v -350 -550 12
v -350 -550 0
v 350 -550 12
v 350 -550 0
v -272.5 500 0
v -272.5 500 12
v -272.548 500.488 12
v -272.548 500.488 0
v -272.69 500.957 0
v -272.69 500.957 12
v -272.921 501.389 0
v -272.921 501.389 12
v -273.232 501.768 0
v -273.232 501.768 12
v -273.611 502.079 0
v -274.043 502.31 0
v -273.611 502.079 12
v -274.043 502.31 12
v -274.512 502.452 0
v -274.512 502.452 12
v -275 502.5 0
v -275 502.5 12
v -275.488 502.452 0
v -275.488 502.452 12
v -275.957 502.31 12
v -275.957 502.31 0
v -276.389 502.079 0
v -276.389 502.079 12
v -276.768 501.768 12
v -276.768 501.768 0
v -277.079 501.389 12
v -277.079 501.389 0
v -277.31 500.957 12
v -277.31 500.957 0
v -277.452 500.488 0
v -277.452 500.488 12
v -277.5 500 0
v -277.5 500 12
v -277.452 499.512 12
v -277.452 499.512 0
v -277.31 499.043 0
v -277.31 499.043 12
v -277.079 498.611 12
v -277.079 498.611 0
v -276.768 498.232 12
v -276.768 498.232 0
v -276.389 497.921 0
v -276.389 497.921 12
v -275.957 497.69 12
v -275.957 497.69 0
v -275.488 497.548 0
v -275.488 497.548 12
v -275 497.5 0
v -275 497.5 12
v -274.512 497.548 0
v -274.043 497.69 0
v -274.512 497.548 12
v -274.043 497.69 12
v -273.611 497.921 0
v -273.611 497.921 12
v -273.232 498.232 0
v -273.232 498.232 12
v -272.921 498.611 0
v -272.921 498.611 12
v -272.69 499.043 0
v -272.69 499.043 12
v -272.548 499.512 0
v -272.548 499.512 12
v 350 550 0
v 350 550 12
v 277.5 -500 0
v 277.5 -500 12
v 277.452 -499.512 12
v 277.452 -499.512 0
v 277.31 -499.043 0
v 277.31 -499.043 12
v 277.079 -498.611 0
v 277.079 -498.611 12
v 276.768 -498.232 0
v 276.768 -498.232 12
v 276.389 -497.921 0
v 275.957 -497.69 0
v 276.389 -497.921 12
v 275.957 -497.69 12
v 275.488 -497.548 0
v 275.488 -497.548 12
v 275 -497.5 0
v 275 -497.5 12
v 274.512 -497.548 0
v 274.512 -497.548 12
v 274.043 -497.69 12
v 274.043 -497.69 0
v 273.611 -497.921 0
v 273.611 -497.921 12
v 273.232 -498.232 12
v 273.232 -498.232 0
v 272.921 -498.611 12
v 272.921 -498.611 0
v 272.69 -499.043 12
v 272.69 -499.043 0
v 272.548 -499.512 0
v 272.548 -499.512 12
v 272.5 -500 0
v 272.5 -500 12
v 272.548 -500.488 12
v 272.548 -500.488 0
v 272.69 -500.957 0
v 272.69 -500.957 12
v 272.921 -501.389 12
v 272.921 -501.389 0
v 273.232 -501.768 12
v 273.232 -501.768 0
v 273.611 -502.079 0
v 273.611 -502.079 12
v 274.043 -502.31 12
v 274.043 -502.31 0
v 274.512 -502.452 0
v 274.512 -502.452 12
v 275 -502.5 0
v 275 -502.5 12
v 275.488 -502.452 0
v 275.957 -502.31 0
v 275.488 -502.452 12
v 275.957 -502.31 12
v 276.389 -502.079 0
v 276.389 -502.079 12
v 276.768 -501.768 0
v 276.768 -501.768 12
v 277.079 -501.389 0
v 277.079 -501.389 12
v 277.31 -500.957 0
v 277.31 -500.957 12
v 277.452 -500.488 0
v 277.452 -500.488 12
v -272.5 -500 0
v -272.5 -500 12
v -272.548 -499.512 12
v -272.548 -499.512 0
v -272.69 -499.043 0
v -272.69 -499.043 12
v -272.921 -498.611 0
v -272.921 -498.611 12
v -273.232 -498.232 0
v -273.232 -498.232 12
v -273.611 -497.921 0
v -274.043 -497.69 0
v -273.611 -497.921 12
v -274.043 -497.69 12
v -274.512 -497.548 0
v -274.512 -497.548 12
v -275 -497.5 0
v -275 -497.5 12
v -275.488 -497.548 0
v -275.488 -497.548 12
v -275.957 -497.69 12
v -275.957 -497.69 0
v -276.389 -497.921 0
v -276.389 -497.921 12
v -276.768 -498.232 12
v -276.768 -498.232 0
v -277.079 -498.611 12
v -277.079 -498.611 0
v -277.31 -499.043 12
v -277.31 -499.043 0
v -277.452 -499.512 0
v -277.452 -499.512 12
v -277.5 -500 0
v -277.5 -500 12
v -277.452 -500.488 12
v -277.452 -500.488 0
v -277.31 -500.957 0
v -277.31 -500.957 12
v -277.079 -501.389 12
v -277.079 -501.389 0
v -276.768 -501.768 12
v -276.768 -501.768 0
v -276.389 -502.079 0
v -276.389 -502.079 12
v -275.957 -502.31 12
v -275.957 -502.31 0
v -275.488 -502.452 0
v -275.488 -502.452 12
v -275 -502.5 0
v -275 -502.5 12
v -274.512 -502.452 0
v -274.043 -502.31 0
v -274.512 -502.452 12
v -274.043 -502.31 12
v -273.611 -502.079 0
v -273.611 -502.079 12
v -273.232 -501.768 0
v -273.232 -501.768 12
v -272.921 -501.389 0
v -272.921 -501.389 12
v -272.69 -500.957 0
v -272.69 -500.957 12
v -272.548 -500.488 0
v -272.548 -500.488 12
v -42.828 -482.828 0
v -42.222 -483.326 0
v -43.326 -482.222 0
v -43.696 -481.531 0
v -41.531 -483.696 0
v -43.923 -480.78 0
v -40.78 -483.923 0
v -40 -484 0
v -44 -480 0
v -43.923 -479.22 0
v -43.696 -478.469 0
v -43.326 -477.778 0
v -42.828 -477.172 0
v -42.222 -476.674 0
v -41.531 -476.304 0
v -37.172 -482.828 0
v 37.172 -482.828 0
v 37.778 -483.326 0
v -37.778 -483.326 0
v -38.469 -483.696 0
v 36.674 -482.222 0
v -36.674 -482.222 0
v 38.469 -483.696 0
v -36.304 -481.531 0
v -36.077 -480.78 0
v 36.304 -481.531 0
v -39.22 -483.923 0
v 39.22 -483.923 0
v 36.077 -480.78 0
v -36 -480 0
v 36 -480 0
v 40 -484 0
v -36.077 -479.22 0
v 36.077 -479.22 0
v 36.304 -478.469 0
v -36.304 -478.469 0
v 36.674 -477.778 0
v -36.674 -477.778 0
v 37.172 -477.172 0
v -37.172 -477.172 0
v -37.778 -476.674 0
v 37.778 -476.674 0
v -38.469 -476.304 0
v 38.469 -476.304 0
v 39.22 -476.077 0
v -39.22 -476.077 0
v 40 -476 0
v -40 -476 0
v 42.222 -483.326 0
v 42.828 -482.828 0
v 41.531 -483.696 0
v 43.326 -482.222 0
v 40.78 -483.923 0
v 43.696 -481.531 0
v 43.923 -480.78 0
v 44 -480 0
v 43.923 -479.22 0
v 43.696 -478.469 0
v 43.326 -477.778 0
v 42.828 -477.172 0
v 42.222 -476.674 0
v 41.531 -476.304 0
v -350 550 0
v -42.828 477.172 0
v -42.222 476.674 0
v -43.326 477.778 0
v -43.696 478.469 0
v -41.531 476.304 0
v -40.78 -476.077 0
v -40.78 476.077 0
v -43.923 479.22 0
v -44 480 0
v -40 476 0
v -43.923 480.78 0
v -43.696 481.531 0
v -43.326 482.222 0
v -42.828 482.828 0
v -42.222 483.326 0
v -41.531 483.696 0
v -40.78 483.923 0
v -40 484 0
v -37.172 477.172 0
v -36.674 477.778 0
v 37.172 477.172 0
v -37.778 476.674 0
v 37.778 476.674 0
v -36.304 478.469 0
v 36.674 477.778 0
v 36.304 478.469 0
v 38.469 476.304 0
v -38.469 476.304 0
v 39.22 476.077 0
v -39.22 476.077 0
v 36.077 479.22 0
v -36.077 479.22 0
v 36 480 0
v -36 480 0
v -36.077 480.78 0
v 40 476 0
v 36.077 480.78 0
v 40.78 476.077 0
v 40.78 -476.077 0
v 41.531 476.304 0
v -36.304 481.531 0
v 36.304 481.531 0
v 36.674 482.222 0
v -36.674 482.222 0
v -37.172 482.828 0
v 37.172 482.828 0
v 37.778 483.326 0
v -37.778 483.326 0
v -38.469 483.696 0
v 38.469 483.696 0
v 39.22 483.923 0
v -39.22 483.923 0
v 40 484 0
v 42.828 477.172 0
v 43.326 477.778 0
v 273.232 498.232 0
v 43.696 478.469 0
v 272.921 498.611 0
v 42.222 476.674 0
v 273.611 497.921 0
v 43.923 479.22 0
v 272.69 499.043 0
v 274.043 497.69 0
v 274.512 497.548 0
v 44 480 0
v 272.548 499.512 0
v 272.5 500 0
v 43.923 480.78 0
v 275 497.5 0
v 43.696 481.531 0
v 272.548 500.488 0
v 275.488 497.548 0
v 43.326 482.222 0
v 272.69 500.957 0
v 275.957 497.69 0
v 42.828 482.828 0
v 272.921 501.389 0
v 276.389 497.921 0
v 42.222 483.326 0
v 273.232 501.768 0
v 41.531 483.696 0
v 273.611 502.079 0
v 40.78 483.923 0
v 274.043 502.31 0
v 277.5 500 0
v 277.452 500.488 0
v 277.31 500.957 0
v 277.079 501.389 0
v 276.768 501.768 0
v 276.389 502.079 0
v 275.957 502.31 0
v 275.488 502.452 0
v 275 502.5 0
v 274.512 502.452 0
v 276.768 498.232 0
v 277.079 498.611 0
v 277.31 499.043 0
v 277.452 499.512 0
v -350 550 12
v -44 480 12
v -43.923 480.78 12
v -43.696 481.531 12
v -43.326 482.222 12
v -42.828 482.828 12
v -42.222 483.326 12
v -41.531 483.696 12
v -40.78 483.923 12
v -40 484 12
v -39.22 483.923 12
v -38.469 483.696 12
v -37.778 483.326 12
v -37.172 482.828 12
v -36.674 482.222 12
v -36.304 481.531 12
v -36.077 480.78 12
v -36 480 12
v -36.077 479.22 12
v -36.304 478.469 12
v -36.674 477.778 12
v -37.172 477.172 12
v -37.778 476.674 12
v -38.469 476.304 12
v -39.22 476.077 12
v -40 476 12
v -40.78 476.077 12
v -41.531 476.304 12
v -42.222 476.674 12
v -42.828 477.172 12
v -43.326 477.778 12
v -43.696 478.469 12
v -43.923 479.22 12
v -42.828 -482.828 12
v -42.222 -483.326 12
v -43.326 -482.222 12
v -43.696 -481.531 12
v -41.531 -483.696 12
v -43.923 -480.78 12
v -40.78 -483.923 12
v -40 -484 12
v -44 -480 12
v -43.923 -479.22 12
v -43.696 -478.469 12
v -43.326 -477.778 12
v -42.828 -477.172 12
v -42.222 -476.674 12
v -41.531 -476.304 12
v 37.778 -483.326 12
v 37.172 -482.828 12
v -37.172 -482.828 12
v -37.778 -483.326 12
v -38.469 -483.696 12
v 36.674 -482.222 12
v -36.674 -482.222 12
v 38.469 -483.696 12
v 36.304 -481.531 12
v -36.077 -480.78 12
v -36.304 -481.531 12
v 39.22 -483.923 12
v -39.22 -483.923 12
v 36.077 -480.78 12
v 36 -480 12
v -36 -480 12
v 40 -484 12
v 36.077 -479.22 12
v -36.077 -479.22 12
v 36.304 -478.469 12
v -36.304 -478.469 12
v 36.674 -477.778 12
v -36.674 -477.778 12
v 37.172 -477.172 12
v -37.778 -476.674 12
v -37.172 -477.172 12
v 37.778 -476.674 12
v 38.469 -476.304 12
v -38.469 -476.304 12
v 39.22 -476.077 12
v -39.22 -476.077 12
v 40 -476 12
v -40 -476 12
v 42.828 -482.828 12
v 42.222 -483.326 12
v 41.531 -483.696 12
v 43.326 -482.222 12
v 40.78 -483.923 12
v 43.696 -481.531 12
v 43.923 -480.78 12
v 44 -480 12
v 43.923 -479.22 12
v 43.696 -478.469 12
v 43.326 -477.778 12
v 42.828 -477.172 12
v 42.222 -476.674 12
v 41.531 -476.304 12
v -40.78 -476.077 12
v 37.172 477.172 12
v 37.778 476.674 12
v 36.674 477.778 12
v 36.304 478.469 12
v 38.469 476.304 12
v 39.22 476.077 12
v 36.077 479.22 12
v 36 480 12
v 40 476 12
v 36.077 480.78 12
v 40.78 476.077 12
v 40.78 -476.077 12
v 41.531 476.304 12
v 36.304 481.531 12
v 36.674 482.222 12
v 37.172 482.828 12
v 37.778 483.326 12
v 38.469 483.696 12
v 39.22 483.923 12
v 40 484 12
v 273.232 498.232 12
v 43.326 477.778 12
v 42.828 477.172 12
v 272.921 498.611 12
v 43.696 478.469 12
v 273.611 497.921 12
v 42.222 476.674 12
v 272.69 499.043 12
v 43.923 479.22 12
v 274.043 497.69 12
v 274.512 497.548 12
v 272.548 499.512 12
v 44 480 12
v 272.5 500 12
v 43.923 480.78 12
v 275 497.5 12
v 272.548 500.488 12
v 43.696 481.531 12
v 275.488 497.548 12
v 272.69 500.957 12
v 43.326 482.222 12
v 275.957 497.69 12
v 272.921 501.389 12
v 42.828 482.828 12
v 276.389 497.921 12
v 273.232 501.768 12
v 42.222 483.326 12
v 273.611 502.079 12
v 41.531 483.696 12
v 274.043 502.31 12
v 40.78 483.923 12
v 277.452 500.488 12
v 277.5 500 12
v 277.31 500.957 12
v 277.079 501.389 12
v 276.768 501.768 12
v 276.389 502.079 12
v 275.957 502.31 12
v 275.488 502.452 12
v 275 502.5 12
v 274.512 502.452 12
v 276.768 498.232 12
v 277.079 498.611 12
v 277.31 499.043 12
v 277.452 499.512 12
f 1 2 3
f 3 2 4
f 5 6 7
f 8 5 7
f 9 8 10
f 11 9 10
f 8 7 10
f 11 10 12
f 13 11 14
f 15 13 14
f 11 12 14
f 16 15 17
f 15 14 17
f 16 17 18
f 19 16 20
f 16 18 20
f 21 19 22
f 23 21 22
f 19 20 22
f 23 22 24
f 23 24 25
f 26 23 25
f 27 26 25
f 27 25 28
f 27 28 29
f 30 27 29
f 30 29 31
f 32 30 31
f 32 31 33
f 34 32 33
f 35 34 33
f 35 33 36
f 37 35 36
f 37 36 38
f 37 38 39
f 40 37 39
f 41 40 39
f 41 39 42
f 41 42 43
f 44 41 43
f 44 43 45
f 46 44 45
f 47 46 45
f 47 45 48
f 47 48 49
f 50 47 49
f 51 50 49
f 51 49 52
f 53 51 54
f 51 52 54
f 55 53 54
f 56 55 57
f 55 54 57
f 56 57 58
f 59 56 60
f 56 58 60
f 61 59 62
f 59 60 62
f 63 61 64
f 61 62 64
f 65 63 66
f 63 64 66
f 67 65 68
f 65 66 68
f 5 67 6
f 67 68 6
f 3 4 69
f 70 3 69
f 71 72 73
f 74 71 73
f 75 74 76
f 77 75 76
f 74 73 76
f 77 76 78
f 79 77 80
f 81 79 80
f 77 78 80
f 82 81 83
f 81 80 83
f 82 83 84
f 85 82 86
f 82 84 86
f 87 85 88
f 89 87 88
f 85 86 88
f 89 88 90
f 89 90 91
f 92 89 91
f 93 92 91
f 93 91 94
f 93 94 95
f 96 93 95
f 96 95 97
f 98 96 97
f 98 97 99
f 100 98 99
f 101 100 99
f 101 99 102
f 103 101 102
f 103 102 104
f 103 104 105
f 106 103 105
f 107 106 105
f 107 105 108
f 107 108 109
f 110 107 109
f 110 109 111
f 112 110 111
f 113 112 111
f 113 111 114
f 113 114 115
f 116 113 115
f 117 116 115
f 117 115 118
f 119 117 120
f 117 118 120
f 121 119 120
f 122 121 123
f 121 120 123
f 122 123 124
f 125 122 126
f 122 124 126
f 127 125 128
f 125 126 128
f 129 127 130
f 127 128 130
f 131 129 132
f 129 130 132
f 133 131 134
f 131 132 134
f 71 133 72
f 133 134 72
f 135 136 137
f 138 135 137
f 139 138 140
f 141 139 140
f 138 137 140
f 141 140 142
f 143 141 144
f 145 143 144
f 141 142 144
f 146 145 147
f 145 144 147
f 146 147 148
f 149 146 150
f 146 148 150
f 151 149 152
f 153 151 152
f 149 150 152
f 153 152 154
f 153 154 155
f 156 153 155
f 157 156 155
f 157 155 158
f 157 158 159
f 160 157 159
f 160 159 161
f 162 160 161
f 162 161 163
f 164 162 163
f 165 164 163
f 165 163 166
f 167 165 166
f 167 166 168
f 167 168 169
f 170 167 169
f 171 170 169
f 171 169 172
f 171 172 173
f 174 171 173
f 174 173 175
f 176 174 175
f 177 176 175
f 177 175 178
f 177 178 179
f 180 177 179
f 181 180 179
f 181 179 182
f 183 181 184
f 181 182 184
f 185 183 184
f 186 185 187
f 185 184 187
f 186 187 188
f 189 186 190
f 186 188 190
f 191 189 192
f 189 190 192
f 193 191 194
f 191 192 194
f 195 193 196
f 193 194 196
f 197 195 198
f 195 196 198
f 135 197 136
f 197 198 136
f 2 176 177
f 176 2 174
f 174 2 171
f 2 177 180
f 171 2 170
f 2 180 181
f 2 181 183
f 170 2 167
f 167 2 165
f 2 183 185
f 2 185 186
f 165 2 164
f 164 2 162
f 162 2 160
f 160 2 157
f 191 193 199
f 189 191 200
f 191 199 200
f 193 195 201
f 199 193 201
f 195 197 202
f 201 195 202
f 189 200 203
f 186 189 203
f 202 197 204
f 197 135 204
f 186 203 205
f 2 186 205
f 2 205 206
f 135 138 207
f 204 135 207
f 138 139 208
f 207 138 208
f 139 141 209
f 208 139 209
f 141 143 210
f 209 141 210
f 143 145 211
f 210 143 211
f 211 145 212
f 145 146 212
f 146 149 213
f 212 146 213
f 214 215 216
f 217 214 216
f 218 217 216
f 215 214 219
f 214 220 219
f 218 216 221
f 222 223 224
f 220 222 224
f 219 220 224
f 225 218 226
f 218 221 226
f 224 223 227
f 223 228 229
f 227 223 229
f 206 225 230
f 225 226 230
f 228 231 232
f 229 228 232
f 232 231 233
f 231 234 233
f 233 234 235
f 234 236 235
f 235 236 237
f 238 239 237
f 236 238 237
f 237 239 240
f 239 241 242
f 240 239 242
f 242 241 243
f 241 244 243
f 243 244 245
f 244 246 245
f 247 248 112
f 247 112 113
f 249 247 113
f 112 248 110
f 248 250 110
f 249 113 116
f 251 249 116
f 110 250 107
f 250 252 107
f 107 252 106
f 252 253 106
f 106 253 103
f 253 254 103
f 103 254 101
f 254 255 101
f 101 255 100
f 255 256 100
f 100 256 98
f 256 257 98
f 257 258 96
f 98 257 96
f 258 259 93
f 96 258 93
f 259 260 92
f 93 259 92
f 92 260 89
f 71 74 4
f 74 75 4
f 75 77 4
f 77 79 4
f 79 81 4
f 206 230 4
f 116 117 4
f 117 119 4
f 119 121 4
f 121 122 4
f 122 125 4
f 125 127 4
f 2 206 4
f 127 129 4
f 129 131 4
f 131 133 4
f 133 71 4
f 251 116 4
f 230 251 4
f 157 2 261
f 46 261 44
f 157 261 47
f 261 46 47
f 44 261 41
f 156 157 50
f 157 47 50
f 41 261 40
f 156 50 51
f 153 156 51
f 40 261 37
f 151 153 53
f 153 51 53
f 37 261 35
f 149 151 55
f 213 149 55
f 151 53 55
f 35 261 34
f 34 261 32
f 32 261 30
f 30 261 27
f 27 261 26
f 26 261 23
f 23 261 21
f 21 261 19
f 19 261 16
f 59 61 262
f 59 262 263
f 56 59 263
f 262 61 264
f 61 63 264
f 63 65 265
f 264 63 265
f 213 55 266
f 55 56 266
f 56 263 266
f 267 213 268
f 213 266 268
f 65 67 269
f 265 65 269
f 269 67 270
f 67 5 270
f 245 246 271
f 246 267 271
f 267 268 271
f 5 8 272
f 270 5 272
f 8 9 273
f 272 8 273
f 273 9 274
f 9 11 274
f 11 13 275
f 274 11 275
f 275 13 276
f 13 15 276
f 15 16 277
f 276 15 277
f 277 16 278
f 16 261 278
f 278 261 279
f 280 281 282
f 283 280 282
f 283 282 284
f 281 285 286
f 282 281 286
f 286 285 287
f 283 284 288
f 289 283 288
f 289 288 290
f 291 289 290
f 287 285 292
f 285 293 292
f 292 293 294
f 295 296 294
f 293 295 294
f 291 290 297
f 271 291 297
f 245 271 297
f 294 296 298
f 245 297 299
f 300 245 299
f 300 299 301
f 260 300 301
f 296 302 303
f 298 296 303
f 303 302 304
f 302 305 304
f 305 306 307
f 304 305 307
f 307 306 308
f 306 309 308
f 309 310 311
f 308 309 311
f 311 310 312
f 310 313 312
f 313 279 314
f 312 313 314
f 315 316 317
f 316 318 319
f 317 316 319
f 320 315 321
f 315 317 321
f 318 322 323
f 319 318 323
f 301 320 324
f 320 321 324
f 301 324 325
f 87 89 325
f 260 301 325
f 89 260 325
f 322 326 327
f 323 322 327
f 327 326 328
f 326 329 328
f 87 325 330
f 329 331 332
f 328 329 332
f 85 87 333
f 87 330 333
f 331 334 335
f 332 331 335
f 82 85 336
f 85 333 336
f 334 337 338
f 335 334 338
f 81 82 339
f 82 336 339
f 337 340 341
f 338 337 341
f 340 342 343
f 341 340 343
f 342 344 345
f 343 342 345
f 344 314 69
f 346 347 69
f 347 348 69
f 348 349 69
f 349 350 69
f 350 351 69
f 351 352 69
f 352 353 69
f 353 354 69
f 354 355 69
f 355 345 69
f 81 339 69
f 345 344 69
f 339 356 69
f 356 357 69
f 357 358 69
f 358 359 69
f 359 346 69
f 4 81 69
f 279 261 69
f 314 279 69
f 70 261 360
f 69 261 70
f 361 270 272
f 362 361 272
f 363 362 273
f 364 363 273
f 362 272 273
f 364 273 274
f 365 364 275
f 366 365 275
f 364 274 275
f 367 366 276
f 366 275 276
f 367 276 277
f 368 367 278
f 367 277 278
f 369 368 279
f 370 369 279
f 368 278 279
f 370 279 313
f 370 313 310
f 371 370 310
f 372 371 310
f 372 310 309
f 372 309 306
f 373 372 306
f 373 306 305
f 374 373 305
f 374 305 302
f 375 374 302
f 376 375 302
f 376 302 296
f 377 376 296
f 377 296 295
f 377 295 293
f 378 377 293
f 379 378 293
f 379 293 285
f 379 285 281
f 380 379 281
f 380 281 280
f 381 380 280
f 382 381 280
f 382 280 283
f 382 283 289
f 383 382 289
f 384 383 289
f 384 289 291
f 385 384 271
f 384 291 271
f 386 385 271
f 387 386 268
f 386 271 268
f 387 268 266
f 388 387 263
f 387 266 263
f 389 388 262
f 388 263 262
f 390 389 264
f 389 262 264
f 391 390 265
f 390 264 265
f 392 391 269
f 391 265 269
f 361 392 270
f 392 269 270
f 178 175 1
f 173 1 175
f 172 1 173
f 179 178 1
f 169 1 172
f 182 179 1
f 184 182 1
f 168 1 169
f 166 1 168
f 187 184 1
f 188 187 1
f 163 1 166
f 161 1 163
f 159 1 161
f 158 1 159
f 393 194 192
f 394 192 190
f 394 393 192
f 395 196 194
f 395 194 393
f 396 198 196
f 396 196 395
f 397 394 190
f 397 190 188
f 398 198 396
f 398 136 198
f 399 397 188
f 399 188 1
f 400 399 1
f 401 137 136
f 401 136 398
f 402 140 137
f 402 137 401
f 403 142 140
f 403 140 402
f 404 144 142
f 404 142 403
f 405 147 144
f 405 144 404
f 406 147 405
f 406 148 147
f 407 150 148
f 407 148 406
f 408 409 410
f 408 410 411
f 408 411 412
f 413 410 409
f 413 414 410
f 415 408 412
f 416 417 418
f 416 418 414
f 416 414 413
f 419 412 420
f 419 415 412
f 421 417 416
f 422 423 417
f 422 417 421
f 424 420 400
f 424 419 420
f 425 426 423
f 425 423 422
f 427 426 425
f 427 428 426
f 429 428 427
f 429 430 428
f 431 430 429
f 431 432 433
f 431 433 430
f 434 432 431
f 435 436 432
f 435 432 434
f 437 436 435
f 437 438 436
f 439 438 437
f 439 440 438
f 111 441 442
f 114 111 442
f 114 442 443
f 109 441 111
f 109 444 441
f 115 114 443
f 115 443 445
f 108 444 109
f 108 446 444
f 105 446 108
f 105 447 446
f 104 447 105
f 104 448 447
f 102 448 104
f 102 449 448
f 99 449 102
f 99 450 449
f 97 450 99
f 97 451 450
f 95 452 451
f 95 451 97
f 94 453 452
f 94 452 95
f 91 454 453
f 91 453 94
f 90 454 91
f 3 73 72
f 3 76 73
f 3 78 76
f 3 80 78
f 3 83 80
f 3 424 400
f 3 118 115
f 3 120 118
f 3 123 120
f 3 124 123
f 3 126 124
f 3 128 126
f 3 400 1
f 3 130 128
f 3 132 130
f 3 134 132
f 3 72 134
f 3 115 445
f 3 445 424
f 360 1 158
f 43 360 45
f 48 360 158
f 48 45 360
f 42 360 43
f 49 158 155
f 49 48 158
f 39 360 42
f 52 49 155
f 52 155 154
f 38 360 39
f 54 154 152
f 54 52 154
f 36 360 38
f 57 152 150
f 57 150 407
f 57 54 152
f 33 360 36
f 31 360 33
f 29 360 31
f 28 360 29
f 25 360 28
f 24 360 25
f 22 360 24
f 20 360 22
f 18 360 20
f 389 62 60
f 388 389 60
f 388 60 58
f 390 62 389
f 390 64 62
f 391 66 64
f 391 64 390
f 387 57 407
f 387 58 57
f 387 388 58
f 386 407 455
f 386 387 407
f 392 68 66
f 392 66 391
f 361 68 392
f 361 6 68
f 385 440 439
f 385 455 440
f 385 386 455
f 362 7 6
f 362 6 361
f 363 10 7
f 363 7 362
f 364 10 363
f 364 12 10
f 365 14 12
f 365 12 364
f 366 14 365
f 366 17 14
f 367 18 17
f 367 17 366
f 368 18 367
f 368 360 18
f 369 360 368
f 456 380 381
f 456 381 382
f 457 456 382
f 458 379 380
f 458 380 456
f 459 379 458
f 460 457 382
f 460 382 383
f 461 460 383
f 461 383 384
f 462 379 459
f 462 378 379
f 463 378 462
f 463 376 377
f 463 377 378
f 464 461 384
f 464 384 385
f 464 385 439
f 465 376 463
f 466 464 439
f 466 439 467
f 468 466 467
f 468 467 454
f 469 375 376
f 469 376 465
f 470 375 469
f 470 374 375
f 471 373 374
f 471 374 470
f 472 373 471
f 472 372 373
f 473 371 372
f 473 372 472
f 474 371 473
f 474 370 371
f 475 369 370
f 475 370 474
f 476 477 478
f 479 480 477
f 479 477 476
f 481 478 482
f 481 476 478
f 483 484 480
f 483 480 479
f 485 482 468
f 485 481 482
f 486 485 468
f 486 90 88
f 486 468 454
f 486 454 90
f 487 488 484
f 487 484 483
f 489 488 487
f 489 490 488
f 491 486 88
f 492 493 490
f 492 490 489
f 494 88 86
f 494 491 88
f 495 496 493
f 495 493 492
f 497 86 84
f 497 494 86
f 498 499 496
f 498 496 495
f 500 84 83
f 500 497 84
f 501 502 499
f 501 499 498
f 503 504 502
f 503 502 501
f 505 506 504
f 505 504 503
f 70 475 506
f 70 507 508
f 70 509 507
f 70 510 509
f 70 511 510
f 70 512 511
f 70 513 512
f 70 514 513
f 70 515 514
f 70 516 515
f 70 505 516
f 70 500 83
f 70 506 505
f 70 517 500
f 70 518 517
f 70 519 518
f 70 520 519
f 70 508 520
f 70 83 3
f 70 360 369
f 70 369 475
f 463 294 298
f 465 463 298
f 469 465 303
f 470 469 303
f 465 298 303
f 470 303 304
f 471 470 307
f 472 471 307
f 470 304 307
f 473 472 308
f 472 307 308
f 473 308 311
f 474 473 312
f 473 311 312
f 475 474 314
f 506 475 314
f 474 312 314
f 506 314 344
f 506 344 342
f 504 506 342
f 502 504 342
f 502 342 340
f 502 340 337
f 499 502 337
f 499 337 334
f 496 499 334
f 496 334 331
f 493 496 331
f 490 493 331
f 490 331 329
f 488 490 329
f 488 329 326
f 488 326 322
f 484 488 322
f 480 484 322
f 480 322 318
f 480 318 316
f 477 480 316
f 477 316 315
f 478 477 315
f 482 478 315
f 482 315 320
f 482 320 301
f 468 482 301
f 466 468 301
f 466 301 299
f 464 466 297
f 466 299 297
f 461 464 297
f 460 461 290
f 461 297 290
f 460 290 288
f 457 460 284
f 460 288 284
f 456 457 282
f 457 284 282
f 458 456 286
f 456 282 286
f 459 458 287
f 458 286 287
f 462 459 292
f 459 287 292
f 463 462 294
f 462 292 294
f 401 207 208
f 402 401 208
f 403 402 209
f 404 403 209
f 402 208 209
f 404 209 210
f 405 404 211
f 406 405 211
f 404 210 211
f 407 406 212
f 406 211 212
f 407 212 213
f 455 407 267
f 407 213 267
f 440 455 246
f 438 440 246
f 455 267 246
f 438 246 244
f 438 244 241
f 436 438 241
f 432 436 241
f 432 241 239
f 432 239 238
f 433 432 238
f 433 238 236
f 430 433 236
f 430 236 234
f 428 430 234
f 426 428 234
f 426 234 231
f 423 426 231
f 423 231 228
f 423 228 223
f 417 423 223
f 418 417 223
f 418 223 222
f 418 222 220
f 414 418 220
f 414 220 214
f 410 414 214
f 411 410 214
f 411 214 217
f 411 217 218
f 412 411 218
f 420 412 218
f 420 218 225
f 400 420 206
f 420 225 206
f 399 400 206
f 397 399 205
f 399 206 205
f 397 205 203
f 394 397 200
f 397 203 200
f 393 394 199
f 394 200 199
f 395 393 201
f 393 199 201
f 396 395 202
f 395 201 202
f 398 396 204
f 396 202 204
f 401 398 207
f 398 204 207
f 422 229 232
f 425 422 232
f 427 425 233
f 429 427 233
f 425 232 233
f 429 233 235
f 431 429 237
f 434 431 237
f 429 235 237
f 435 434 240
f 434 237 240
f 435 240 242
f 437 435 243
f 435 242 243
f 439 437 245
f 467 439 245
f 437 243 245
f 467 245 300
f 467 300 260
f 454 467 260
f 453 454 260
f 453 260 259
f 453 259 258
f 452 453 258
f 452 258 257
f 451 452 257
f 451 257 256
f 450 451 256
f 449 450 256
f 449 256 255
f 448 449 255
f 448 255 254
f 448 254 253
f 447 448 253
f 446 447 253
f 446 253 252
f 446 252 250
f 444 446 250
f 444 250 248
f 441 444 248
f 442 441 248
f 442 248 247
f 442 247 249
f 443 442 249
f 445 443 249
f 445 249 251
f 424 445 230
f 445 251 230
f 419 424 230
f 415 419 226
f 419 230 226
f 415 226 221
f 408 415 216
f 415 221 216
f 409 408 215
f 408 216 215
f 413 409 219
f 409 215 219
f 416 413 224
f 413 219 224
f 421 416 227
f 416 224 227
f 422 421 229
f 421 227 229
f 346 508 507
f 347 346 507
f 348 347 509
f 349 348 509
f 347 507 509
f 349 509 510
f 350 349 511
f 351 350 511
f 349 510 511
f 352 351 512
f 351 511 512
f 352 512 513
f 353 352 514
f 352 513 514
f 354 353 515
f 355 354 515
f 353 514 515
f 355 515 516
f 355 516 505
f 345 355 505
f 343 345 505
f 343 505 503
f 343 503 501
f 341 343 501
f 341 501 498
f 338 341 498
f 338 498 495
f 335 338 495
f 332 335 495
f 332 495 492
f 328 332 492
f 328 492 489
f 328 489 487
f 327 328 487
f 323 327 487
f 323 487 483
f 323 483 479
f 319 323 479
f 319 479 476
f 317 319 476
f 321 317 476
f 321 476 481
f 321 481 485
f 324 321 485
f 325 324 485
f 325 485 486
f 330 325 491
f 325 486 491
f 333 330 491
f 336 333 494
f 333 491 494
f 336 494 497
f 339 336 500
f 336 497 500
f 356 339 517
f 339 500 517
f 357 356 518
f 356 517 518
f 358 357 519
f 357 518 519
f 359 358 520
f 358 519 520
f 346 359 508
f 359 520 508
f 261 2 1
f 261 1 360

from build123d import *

# Parameters (mm, degrees)
F0_W     = 700
F0_H     = 1100
F1_DEPTH = 12
F2_R     = 2.5
F3_DEPTH = 12.001
F4_D     = 8


with BuildPart() as f1:
    # F0 (on Top) → F1 (new body)
    with BuildSketch(Plane.XY):
        Rectangle(F0_W, F0_H)
    extrude(amount=F1_DEPTH)

    # F2 (on face) → F3 (cut, through all)
    with BuildSketch(Plane.XY.offset(12)):
        with Locations((-275, -500)):
            Circle(F2_R)
        with Locations((275, -500)):
            Circle(F2_R)
        with Locations((-275, 500)):
            Circle(F2_R)
        with Locations((275, 500)):
            Circle(F2_R)
    extrude(amount=-F3_DEPTH, mode=Mode.SUBTRACT)

    # F4 (through all)
    with Locations(Plane.XY.offset(12)):
        with Locations((40, 480), (-40, 480), (40, -480), (-40, -480)):
            Hole(F4_D / 2)


solid = f1.part
